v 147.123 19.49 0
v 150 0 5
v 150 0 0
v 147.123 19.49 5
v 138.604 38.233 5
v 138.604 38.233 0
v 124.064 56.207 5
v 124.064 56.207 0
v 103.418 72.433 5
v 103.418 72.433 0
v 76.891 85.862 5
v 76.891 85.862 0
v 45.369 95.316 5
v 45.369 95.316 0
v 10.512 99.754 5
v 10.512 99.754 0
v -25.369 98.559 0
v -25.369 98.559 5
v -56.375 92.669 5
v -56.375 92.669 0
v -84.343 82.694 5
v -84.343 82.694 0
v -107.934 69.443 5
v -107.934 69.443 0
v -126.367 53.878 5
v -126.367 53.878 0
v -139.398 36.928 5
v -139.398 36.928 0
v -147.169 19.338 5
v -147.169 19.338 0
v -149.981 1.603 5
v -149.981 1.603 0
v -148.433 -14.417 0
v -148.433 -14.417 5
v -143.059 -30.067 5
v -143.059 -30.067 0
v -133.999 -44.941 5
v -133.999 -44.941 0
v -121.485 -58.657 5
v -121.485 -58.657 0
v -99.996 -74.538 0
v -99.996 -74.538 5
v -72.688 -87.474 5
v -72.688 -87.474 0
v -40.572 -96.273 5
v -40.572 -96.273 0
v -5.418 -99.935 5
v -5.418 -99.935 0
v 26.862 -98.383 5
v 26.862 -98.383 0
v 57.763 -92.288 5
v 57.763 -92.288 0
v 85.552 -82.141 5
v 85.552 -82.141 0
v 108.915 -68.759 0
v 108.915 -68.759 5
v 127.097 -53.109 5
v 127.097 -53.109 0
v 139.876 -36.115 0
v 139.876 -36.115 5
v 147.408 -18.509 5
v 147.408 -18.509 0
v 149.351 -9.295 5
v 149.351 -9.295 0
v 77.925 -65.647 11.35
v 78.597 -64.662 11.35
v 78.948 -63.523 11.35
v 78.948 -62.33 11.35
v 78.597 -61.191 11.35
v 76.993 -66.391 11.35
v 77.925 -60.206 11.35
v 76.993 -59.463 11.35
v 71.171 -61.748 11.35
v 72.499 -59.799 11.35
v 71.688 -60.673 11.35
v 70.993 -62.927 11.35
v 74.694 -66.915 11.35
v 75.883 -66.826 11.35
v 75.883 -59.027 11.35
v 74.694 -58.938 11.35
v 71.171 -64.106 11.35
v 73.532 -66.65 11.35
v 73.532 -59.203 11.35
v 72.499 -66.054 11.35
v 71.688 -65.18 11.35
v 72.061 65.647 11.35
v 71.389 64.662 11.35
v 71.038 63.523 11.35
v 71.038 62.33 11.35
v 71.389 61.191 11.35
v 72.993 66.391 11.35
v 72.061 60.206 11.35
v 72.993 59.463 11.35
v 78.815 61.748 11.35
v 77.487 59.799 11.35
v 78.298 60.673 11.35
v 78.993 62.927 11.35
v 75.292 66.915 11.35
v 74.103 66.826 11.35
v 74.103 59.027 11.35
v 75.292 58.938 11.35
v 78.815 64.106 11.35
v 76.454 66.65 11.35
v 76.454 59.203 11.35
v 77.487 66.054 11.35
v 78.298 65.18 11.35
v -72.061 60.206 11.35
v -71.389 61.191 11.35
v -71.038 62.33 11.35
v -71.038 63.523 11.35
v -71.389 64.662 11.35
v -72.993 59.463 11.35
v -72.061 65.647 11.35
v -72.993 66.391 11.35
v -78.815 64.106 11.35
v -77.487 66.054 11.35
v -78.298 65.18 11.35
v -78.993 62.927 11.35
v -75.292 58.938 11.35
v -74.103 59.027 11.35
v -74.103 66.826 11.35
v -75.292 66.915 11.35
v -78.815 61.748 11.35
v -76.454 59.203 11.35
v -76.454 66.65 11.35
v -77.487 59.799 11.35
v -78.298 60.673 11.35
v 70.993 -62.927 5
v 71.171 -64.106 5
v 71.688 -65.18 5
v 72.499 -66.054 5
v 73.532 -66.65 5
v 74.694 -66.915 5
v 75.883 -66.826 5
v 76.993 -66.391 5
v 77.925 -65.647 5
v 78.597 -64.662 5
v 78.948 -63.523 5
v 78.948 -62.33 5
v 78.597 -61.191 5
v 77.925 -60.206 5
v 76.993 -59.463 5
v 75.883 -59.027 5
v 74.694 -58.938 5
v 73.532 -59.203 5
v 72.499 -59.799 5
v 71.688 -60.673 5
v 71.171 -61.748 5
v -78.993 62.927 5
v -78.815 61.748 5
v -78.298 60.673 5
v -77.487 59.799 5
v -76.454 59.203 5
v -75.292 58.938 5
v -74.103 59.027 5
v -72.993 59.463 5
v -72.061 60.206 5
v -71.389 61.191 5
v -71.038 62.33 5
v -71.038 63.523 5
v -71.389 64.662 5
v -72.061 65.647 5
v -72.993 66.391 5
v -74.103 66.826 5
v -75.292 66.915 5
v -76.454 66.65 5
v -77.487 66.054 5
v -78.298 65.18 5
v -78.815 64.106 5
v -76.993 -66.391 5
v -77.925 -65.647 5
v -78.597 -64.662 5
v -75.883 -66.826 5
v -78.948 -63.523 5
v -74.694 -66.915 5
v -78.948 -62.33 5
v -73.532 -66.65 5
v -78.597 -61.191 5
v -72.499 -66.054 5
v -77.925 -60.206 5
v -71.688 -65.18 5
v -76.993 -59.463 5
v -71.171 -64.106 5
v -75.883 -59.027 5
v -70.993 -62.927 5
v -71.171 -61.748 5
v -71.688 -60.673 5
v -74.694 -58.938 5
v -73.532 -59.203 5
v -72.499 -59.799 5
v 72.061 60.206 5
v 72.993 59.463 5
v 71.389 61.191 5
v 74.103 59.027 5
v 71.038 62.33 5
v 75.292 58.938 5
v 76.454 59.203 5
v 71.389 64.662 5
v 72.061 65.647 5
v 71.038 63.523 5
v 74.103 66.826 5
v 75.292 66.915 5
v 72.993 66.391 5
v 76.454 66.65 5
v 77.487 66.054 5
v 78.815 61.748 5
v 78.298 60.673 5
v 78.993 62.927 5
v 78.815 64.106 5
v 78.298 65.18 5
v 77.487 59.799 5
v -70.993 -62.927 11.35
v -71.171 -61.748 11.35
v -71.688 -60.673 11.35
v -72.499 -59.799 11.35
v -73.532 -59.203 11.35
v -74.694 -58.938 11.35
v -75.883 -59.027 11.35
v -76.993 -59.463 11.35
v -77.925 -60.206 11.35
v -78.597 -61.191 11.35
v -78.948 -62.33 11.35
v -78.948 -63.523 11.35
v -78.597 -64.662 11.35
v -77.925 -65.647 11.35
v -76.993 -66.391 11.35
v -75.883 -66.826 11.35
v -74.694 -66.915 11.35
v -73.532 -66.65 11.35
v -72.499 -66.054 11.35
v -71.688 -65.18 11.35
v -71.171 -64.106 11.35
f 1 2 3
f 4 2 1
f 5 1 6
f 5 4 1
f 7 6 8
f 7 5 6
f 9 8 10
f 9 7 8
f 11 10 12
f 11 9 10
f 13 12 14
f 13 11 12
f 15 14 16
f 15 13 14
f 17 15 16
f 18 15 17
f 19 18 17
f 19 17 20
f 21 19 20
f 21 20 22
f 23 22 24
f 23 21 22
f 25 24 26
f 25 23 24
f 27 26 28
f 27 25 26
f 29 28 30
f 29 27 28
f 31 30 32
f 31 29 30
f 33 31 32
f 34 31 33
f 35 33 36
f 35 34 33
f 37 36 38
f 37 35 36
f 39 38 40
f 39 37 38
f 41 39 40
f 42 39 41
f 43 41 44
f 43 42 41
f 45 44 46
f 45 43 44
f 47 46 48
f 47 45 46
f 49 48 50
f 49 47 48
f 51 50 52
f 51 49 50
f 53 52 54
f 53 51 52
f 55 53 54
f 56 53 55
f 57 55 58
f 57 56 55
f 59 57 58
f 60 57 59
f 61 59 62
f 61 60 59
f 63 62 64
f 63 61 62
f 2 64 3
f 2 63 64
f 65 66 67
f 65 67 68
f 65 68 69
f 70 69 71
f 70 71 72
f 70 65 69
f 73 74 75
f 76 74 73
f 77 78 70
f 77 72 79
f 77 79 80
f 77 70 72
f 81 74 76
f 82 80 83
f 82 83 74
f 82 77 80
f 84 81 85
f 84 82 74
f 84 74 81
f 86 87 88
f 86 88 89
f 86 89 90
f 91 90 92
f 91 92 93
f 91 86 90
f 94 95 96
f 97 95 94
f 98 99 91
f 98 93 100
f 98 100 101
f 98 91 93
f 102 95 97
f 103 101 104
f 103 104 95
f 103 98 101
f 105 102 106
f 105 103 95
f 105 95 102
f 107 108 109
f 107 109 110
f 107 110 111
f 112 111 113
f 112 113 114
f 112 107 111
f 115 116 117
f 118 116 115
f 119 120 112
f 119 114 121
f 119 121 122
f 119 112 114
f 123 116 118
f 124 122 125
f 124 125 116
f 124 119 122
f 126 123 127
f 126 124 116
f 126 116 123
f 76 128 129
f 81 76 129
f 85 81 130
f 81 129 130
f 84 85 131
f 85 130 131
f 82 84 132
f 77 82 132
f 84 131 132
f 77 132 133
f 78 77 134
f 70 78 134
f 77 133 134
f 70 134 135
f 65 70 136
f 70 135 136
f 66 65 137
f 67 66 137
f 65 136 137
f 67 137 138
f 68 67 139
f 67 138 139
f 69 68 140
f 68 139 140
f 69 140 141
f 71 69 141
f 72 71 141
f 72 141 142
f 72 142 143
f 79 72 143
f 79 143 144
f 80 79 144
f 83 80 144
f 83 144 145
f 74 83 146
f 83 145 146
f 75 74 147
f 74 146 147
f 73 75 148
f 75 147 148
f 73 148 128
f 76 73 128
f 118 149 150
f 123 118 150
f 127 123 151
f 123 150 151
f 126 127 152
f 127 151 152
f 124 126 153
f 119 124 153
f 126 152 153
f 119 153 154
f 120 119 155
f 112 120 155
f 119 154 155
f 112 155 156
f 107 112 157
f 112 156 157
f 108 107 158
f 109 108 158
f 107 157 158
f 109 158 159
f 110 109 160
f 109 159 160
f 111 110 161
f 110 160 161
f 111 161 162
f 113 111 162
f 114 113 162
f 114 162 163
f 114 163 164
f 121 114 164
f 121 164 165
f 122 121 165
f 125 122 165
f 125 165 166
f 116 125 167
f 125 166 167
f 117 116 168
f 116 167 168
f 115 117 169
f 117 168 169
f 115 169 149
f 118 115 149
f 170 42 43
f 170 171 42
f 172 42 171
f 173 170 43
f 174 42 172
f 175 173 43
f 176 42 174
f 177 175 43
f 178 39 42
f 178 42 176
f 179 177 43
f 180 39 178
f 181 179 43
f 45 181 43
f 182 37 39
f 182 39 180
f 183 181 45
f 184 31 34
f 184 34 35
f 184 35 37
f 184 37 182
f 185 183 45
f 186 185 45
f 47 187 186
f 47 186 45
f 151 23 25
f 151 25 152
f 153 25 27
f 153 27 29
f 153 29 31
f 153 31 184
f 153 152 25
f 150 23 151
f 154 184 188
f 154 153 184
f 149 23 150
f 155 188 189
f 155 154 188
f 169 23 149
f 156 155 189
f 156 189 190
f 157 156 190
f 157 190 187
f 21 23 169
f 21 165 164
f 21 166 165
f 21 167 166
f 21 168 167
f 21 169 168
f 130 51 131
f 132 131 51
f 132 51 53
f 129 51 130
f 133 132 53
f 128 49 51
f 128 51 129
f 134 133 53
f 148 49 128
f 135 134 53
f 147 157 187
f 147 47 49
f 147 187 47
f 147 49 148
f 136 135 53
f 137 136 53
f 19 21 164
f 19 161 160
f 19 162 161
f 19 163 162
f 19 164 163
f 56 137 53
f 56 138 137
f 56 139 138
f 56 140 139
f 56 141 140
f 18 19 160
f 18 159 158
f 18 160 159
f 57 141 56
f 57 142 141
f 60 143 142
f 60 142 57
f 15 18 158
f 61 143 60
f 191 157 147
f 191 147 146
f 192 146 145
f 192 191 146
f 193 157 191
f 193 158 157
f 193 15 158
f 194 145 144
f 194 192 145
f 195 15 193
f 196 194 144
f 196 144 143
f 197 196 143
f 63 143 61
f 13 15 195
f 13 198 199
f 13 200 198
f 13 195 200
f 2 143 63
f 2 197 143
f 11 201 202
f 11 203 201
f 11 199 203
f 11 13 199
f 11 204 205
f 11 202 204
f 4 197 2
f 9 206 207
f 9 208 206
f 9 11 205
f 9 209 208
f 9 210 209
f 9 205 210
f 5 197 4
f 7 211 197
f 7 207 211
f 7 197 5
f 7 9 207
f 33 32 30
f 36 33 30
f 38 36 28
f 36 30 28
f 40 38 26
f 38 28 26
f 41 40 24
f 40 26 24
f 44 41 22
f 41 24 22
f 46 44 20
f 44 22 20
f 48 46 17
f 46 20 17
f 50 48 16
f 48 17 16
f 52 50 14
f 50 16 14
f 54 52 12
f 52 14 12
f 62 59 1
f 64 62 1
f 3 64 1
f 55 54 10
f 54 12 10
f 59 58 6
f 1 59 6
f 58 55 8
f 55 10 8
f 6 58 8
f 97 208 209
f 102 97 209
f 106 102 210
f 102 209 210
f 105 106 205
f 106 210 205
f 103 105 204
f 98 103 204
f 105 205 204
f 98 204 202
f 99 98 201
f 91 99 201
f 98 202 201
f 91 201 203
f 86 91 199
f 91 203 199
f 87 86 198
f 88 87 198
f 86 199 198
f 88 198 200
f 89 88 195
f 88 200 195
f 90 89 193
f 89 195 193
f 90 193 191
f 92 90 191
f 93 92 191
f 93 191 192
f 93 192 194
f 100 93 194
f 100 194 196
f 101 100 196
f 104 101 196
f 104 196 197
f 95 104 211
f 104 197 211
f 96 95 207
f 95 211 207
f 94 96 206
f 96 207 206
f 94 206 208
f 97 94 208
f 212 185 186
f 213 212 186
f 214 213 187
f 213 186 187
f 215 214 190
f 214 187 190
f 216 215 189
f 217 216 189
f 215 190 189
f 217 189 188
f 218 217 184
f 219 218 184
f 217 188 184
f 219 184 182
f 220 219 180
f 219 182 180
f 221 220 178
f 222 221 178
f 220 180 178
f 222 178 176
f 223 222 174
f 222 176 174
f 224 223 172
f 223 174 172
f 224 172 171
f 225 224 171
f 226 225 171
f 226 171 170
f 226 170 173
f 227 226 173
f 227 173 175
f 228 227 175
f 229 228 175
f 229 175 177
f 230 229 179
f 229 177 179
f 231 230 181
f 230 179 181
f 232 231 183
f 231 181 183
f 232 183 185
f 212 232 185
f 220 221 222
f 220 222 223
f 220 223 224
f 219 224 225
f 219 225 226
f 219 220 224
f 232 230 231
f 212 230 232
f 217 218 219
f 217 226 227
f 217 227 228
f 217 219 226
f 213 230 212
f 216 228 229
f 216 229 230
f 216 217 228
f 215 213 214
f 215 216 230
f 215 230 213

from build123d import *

# Parameters (mm, degrees)
SKETCH1_RX          = 150
SKETCH1_RY          = 100
BOSS_EXTRUDE1_DEPTH = 5
SKETCH2_R           = 4
BOSS_EXTRUDE2_DEPTH = 6.35


with BuildPart() as part:
    # Sketch1 → Boss-Extrude1 (new body)
    with BuildSketch(Plane.XY.offset(5)):
        with Locations(Location((0, 0), (0, 0, 0))):
            Ellipse(SKETCH1_RX, SKETCH1_RY)
    extrude(amount=-BOSS_EXTRUDE1_DEPTH)

    # Sketch2 → Boss-Extrude2 (add)
    with BuildSketch(Plane.XY.offset(5)):
        with Locations((-74.99305396, -62.926643919)):
            Circle(SKETCH2_R)
        with Locations(Location((-74.99305396, 62.926643919, 0), (0, 0, 180))):
            Circle(SKETCH2_R)
        with Locations((74.99305396, 62.926643919)):
            Circle(SKETCH2_R)
        with Locations(Location((74.99305396, -62.926643919, 0), (0, 0, 180))):
            Circle(SKETCH2_R)
    extrude(amount=BOSS_EXTRUDE2_DEPTH)


solid = part.part
